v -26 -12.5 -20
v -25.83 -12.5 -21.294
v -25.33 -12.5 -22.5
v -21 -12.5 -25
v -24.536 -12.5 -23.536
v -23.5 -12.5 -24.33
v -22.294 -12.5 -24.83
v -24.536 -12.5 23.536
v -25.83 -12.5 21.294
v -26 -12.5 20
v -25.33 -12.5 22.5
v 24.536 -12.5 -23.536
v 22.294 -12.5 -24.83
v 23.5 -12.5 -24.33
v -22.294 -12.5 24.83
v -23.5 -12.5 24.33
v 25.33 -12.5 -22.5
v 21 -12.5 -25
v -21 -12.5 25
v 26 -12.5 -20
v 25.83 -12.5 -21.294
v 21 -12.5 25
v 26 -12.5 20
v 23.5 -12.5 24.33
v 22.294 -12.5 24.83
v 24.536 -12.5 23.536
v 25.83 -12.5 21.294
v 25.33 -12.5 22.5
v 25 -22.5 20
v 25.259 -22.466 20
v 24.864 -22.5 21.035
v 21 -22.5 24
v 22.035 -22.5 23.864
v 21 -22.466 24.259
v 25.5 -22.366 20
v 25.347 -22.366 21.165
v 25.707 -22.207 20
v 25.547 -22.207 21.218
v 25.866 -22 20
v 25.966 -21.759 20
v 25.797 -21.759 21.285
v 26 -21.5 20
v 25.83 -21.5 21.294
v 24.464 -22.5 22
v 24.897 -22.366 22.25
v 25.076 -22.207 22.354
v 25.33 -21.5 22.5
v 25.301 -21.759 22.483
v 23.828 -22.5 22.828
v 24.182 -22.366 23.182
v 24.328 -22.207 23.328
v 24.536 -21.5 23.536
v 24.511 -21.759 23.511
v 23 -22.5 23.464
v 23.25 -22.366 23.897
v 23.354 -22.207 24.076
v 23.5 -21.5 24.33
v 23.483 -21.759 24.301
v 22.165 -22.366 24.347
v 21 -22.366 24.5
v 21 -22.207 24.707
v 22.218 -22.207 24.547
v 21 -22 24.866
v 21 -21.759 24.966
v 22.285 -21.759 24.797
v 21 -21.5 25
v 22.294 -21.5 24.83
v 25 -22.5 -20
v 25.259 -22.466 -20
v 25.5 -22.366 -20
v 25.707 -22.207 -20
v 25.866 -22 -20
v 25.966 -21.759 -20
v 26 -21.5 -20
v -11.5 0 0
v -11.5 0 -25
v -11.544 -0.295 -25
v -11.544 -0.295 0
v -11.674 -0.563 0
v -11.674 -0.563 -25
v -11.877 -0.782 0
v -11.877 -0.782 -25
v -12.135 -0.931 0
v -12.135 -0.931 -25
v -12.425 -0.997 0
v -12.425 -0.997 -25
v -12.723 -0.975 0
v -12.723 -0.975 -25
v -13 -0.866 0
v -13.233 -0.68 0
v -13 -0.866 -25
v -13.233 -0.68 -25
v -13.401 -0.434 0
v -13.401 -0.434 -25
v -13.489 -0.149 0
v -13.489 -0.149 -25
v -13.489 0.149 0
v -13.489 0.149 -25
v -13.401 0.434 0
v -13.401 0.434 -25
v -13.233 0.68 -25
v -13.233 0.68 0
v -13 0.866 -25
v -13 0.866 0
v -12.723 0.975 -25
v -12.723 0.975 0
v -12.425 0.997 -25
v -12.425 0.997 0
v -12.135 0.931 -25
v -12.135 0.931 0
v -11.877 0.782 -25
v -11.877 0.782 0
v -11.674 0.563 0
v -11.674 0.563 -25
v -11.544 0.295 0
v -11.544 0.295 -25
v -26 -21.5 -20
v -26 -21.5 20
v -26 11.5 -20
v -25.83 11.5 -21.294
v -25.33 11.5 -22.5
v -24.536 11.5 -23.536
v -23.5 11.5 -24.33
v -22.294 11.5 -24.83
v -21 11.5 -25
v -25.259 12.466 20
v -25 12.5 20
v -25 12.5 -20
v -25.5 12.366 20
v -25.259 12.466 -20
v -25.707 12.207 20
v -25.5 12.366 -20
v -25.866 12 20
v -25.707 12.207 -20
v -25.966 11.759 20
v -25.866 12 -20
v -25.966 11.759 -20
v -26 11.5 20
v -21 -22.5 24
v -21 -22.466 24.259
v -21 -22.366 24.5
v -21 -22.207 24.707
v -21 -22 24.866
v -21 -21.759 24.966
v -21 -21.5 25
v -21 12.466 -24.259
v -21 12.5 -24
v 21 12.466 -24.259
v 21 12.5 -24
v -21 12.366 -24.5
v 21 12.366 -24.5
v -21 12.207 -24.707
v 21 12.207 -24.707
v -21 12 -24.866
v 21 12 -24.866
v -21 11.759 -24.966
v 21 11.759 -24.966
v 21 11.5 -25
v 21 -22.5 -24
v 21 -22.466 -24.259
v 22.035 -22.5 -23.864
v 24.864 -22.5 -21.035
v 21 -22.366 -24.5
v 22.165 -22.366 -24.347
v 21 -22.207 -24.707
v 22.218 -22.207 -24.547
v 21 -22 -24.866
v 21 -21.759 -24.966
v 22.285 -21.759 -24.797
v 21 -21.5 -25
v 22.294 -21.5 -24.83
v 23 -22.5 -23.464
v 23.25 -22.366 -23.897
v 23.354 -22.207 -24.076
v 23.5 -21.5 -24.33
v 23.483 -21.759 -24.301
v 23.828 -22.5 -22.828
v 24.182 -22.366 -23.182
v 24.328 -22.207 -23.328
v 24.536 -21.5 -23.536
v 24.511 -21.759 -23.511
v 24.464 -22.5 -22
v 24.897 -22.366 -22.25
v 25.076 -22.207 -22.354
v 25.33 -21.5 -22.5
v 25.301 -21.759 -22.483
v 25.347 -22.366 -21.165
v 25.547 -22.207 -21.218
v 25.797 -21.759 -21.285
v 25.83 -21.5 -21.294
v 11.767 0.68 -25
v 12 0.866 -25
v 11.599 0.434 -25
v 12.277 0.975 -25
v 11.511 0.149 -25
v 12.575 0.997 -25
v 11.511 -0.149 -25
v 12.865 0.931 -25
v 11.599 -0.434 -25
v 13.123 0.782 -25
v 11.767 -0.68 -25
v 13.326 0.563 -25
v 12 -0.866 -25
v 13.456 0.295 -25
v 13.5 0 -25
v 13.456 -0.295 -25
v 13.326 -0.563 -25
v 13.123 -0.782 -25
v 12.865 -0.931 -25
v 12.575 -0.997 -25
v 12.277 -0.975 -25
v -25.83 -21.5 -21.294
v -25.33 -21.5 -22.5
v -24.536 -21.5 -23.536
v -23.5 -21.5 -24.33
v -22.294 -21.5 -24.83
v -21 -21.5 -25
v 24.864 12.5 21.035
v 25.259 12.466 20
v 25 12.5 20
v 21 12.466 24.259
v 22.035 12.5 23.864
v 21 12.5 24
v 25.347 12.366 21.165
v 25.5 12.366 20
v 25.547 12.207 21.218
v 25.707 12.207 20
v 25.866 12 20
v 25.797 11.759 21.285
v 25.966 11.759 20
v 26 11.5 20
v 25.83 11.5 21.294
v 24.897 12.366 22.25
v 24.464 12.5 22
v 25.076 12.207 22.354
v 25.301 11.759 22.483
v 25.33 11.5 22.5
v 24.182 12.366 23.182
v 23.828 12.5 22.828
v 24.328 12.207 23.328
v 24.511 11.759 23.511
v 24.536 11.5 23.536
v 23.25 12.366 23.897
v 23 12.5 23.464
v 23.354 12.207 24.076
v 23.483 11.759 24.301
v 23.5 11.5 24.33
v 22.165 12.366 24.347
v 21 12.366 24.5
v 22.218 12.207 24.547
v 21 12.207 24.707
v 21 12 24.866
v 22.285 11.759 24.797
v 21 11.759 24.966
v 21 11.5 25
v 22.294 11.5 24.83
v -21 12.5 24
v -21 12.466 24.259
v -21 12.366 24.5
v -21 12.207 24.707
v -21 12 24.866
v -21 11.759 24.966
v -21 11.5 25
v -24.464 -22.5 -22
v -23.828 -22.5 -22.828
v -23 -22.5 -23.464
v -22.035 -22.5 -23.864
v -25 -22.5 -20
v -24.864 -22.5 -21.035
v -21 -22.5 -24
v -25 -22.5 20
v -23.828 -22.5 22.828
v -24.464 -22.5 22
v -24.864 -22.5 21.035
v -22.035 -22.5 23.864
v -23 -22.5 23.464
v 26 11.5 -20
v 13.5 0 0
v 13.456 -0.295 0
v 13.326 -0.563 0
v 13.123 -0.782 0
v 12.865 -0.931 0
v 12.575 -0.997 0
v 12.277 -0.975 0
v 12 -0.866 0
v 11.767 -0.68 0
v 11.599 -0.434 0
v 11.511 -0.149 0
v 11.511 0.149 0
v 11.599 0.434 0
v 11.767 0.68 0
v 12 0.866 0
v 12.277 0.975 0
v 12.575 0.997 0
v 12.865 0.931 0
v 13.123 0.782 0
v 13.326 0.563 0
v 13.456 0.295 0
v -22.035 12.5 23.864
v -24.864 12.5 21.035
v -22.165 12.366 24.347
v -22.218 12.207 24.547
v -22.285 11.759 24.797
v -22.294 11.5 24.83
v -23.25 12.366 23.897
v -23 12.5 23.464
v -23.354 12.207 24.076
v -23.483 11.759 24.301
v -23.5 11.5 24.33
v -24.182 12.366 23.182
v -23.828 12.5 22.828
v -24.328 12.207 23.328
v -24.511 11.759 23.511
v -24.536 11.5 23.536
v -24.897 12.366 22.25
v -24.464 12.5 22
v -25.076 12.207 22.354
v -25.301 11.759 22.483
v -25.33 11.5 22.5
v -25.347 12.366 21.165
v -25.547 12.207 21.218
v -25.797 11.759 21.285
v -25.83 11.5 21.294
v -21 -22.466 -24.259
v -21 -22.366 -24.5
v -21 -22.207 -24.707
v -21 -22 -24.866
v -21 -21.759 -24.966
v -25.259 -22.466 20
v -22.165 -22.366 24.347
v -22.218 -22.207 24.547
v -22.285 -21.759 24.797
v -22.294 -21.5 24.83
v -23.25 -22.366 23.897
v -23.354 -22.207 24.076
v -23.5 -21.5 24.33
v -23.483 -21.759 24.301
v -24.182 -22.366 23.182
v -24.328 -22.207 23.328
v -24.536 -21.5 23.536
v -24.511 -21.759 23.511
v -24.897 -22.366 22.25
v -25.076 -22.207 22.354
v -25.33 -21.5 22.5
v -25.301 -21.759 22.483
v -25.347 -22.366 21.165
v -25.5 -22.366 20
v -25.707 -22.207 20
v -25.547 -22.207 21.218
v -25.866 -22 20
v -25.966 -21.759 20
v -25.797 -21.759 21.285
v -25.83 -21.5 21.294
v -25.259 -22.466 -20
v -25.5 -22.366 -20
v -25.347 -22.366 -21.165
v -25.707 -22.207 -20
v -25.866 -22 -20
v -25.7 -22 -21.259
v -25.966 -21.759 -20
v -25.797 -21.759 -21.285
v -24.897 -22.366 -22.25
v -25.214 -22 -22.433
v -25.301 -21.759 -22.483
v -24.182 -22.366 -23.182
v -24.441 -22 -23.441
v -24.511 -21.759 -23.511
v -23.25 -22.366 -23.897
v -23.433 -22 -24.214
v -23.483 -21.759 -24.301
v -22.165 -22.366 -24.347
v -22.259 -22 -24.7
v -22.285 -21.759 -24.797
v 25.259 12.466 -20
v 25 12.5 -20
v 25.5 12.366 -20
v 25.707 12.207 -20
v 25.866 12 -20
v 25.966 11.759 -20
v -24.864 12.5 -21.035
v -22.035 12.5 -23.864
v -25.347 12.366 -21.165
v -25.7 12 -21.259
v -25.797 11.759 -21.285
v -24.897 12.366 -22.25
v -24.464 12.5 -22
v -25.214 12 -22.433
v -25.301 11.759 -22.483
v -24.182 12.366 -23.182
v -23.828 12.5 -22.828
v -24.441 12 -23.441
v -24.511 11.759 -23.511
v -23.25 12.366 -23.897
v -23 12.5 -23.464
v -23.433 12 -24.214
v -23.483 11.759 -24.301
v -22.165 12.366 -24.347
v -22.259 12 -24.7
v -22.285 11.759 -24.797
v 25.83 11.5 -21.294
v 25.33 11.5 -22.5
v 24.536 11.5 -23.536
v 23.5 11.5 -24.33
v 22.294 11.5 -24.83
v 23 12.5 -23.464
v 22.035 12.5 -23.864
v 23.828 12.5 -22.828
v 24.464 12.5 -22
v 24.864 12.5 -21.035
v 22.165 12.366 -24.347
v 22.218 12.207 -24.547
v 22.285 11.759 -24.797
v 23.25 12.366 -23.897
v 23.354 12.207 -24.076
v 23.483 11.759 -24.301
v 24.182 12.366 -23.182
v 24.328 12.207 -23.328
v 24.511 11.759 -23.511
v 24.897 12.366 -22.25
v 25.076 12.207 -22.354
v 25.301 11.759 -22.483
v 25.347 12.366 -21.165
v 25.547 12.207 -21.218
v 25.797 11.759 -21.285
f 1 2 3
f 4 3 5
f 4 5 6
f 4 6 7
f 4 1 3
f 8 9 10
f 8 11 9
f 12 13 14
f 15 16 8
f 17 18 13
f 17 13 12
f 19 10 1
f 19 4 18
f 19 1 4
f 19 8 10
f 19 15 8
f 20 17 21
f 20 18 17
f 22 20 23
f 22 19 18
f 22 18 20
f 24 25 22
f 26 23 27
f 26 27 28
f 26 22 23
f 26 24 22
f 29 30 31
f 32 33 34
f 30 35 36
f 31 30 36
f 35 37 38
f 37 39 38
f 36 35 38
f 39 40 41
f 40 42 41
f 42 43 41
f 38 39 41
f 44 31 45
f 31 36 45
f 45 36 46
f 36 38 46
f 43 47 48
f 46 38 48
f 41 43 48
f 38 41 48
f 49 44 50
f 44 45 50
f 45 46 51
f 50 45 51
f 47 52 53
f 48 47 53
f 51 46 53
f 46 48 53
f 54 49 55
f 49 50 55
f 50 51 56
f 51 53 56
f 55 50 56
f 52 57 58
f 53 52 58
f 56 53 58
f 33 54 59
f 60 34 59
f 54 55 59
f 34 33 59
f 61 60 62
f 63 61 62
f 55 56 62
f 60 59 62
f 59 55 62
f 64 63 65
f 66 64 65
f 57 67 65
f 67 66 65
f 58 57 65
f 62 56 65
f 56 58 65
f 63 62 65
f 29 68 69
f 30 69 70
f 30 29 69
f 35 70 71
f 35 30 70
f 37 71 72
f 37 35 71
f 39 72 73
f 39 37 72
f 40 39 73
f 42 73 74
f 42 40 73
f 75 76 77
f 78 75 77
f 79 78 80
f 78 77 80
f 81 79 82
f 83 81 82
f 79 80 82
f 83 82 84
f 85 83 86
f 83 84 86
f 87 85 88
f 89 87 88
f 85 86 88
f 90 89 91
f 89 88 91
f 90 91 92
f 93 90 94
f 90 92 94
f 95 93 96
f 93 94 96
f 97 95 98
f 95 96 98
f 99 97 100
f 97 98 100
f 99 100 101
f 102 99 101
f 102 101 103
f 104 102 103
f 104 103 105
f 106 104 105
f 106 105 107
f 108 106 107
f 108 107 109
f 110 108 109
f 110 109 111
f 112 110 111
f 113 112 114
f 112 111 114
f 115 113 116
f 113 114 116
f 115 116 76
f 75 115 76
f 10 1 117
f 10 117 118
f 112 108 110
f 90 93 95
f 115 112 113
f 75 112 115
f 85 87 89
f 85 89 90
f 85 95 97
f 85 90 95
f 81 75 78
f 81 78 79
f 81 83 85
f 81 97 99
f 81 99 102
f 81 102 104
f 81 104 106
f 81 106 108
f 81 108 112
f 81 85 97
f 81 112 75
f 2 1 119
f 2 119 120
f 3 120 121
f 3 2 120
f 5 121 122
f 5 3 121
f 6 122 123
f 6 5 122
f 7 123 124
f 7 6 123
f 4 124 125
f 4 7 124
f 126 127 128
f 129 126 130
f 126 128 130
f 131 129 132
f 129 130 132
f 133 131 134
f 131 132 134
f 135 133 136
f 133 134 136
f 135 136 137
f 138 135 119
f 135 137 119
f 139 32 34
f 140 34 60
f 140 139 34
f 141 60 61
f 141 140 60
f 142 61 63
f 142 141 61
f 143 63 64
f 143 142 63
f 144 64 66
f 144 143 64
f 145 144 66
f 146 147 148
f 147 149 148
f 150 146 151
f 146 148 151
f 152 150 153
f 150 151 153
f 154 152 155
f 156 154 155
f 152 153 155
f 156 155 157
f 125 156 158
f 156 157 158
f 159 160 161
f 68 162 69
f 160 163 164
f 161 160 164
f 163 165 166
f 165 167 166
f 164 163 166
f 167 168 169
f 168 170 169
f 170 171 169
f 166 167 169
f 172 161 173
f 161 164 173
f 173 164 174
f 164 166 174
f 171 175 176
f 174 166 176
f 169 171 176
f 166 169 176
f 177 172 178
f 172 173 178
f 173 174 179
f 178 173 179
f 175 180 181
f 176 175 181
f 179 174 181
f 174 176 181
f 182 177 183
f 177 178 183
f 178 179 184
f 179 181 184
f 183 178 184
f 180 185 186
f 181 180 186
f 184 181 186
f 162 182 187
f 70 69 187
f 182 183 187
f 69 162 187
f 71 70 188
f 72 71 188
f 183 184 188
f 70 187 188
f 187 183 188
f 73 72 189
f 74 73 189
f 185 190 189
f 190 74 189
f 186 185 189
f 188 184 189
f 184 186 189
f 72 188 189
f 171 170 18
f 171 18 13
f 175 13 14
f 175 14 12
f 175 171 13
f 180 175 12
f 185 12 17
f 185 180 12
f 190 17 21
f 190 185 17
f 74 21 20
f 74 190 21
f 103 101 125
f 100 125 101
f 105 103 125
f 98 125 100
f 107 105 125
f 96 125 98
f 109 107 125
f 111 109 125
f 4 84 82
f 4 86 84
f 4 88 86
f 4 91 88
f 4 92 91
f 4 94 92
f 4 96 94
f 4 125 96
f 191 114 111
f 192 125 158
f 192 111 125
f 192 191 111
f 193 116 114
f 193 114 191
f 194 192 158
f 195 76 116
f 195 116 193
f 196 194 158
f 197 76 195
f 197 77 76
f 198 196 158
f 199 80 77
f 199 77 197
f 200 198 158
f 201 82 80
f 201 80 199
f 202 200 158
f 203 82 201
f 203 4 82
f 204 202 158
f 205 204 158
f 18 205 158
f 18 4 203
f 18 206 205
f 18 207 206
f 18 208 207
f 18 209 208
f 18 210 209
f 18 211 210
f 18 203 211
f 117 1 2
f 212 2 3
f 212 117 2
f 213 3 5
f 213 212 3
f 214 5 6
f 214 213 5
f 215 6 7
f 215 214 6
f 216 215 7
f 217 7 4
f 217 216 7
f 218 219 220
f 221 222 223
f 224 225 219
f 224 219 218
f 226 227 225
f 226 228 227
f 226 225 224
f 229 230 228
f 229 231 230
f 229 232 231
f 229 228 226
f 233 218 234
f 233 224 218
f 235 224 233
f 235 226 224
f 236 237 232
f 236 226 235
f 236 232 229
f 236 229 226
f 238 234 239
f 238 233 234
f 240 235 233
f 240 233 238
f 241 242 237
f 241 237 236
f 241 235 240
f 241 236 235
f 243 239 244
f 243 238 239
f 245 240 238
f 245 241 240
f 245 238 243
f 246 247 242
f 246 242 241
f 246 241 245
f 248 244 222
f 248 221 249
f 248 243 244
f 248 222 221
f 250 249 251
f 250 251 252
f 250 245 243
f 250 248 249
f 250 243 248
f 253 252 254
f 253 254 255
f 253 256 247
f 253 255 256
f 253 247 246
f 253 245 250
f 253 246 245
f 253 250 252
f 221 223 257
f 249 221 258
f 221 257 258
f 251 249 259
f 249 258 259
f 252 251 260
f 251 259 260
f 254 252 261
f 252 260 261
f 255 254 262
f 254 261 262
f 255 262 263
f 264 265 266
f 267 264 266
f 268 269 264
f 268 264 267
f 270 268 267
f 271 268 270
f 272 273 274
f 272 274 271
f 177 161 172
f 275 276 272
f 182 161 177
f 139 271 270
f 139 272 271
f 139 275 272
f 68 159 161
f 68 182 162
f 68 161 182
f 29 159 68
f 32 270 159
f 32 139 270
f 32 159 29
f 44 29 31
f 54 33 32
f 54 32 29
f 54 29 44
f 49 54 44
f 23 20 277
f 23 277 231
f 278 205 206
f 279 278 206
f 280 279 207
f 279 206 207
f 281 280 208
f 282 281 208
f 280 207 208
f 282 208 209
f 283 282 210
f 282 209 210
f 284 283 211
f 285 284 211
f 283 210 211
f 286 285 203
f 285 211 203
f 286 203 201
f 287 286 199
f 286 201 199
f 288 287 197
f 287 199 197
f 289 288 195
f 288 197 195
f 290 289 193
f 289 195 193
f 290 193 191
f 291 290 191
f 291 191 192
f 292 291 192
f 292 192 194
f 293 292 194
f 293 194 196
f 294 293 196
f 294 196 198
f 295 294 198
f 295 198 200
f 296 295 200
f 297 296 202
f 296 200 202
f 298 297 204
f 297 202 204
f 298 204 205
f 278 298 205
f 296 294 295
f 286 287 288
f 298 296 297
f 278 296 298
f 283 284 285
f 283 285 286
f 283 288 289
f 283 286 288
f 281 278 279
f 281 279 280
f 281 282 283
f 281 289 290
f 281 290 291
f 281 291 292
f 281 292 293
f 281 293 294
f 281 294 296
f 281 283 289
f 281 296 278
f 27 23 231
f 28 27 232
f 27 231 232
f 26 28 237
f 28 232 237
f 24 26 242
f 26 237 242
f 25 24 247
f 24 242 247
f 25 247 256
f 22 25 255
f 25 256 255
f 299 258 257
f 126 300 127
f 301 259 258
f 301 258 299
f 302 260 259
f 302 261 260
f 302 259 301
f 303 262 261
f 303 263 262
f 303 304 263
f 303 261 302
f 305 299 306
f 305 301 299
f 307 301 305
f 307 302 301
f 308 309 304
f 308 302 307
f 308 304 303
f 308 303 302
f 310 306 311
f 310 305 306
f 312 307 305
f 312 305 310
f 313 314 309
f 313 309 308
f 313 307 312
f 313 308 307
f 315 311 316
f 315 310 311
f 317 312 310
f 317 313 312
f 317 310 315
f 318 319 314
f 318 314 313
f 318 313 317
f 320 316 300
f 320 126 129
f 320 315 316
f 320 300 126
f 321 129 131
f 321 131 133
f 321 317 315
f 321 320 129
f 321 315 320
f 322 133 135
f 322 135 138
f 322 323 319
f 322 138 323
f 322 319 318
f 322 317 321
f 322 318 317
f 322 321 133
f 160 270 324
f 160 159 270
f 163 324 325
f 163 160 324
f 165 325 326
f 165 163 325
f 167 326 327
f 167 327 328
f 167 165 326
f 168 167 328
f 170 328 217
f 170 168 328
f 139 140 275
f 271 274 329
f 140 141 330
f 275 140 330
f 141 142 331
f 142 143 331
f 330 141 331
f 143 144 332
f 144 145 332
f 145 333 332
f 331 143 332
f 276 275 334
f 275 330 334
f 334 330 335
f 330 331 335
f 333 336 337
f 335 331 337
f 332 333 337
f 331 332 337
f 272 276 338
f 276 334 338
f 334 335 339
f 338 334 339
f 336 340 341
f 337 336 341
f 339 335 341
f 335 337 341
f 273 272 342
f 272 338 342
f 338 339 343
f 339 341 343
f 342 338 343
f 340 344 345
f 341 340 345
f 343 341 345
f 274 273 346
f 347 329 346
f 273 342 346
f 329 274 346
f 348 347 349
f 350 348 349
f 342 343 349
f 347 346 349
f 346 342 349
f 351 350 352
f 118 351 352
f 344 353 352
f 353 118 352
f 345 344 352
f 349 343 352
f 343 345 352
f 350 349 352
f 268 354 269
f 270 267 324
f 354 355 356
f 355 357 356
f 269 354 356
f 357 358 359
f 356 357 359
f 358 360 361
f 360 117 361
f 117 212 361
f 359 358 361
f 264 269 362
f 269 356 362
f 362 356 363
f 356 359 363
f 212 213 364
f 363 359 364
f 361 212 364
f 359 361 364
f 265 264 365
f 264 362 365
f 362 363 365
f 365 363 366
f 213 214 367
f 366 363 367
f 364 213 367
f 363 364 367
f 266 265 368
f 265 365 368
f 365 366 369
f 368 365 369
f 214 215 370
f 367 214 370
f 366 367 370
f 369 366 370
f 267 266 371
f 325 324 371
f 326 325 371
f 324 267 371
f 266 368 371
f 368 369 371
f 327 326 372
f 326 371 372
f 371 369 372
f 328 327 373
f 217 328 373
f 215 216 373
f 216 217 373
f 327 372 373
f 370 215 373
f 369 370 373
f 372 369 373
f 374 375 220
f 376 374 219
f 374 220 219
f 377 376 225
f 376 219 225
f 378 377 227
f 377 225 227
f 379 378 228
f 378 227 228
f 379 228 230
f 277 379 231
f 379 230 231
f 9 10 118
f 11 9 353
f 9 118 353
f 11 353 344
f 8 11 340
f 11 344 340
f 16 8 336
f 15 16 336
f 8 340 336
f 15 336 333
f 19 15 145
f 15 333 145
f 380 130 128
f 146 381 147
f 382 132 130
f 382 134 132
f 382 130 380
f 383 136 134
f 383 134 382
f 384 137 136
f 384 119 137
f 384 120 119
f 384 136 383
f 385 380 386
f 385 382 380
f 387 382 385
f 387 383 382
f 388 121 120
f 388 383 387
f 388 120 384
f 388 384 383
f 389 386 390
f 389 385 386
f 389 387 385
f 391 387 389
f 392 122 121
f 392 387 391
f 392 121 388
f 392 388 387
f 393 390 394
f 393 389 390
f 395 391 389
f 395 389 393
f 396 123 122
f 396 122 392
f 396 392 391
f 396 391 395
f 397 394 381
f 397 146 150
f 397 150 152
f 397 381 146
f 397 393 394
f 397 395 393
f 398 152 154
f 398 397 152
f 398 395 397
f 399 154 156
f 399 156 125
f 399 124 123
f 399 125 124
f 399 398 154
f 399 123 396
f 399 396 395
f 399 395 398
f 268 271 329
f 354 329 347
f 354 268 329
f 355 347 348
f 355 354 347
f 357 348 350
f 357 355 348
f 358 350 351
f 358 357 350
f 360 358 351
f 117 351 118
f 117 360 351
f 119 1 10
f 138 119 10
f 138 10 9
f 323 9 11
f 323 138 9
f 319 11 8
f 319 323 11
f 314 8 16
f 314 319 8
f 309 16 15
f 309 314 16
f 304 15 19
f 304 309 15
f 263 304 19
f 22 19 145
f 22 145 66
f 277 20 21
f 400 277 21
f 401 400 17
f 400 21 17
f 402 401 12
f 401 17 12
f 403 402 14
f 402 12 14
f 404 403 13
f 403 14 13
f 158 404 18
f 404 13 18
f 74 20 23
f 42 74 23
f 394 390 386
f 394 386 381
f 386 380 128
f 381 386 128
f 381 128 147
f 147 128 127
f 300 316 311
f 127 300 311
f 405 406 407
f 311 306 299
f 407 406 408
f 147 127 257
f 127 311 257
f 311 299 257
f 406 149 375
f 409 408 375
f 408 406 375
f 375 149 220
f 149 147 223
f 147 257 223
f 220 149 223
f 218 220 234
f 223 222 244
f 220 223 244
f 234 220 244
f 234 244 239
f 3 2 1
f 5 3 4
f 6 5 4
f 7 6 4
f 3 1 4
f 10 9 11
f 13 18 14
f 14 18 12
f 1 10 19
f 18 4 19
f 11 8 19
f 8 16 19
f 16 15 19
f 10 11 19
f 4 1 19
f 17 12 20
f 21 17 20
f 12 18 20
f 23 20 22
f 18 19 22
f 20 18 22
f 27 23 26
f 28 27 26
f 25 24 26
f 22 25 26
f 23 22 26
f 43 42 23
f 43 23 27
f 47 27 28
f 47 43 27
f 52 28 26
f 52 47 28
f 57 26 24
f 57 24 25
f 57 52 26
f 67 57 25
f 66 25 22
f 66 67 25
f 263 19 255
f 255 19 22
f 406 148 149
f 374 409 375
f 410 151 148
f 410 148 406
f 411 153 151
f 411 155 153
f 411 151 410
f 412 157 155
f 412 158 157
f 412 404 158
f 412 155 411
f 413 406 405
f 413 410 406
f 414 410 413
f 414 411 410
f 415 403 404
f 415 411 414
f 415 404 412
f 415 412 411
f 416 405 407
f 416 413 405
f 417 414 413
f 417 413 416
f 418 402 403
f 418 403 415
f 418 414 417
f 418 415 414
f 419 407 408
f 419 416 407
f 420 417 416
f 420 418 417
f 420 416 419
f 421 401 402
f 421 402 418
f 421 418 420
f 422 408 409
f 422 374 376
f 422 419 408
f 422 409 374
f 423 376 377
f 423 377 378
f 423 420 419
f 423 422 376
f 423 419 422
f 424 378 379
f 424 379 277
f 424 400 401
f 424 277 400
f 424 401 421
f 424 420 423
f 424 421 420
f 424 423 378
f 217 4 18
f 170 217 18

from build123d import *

# Parameters (mm, degrees)
F0_W     = 52
F0_H     = 50
F1_DEPTH = 12.5
F2_DEPTH = 10
F3_R     = 5
F3_2_R   = 5
F4_R     = 1
F4_2_R   = 1
F5_R     = 1
F6_DEPTH = 25


with BuildPart() as f1:
    # F0 (on Front) → F1 (new body, symmetric)
    with BuildSketch(Plane.XZ):
        Rectangle(F0_W, F0_H)
    extrude(amount=F1_DEPTH, both=True)


with BuildPart() as f2:
    # F2 (new): a face of the model
    f2_faces = [f1.part.faces().sort_by_distance(p)[0] for p in [
        (0, -12.5, 0),
    ]]
    extrude(f2_faces, amount=F2_DEPTH)

    # F3#2
    f3_2_edges = [f2.edges().sort_by_distance(p)[0] for p in [
        (26, -17.5, 25),
        (26, -17.5, -25),
        (-26, -17.5, 25),
        (-26, -17.5, -25),
    ]]
    fillet(f3_2_edges, radius=F3_2_R)

    # F4#2
    f4_2_edges = [f2.edges().sort_by_distance(p)[0] for p in [
        (0, -22.5, -25),
        (-24.535534, -22.5, -23.535534),
        (24.535534, -22.5, -23.535534),
        (-26, -22.5, 0),
        (26, -22.5, 0),
        (-24.535534, -22.5, 23.535534),
        (24.535534, -22.5, 23.535534),
        (0, -22.5, 25),
    ]]
    fillet(f4_2_edges, radius=F4_2_R)


with BuildPart() as f1_1:
    add(f1.part)

    # F3
    f3_edges = [f1_1.edges().sort_by_distance(p)[0] for p in [
        (26, 0, 25),
        (-26, 0, 25),
        (26, 0, -25),
        (-26, 0, -25),
    ]]
    fillet(f3_edges, radius=F3_R)

    # F4
    f4_edges = [f1_1.edges().sort_by_distance(p)[0] for p in [
        (0, 12.5, -25),
        (-24.535534, 12.5, -23.535534),
        (24.535534, 12.5, -23.535534),
        (-26, 12.5, 0),
        (26, 12.5, 0),
        (-24.535534, 12.5, 23.535534),
        (24.535534, 12.5, 23.535534),
        (0, 12.5, 25),
    ]]
    fillet(f4_edges, radius=F4_R)

    # F5 (on face) → F6 (cut)
    with BuildSketch(Plane(origin=(0, 0, -25), x_dir=(1, 0, 0), z_dir=(0, 0, -1))):
        with Locations((-12.5, 0)):
            Circle(F5_R)
        with Locations((12.5, 0)):
            Circle(F5_R)
    extrude(amount=-F6_DEPTH, mode=Mode.SUBTRACT)


solid = Compound([f2.part, f1_1.part])
